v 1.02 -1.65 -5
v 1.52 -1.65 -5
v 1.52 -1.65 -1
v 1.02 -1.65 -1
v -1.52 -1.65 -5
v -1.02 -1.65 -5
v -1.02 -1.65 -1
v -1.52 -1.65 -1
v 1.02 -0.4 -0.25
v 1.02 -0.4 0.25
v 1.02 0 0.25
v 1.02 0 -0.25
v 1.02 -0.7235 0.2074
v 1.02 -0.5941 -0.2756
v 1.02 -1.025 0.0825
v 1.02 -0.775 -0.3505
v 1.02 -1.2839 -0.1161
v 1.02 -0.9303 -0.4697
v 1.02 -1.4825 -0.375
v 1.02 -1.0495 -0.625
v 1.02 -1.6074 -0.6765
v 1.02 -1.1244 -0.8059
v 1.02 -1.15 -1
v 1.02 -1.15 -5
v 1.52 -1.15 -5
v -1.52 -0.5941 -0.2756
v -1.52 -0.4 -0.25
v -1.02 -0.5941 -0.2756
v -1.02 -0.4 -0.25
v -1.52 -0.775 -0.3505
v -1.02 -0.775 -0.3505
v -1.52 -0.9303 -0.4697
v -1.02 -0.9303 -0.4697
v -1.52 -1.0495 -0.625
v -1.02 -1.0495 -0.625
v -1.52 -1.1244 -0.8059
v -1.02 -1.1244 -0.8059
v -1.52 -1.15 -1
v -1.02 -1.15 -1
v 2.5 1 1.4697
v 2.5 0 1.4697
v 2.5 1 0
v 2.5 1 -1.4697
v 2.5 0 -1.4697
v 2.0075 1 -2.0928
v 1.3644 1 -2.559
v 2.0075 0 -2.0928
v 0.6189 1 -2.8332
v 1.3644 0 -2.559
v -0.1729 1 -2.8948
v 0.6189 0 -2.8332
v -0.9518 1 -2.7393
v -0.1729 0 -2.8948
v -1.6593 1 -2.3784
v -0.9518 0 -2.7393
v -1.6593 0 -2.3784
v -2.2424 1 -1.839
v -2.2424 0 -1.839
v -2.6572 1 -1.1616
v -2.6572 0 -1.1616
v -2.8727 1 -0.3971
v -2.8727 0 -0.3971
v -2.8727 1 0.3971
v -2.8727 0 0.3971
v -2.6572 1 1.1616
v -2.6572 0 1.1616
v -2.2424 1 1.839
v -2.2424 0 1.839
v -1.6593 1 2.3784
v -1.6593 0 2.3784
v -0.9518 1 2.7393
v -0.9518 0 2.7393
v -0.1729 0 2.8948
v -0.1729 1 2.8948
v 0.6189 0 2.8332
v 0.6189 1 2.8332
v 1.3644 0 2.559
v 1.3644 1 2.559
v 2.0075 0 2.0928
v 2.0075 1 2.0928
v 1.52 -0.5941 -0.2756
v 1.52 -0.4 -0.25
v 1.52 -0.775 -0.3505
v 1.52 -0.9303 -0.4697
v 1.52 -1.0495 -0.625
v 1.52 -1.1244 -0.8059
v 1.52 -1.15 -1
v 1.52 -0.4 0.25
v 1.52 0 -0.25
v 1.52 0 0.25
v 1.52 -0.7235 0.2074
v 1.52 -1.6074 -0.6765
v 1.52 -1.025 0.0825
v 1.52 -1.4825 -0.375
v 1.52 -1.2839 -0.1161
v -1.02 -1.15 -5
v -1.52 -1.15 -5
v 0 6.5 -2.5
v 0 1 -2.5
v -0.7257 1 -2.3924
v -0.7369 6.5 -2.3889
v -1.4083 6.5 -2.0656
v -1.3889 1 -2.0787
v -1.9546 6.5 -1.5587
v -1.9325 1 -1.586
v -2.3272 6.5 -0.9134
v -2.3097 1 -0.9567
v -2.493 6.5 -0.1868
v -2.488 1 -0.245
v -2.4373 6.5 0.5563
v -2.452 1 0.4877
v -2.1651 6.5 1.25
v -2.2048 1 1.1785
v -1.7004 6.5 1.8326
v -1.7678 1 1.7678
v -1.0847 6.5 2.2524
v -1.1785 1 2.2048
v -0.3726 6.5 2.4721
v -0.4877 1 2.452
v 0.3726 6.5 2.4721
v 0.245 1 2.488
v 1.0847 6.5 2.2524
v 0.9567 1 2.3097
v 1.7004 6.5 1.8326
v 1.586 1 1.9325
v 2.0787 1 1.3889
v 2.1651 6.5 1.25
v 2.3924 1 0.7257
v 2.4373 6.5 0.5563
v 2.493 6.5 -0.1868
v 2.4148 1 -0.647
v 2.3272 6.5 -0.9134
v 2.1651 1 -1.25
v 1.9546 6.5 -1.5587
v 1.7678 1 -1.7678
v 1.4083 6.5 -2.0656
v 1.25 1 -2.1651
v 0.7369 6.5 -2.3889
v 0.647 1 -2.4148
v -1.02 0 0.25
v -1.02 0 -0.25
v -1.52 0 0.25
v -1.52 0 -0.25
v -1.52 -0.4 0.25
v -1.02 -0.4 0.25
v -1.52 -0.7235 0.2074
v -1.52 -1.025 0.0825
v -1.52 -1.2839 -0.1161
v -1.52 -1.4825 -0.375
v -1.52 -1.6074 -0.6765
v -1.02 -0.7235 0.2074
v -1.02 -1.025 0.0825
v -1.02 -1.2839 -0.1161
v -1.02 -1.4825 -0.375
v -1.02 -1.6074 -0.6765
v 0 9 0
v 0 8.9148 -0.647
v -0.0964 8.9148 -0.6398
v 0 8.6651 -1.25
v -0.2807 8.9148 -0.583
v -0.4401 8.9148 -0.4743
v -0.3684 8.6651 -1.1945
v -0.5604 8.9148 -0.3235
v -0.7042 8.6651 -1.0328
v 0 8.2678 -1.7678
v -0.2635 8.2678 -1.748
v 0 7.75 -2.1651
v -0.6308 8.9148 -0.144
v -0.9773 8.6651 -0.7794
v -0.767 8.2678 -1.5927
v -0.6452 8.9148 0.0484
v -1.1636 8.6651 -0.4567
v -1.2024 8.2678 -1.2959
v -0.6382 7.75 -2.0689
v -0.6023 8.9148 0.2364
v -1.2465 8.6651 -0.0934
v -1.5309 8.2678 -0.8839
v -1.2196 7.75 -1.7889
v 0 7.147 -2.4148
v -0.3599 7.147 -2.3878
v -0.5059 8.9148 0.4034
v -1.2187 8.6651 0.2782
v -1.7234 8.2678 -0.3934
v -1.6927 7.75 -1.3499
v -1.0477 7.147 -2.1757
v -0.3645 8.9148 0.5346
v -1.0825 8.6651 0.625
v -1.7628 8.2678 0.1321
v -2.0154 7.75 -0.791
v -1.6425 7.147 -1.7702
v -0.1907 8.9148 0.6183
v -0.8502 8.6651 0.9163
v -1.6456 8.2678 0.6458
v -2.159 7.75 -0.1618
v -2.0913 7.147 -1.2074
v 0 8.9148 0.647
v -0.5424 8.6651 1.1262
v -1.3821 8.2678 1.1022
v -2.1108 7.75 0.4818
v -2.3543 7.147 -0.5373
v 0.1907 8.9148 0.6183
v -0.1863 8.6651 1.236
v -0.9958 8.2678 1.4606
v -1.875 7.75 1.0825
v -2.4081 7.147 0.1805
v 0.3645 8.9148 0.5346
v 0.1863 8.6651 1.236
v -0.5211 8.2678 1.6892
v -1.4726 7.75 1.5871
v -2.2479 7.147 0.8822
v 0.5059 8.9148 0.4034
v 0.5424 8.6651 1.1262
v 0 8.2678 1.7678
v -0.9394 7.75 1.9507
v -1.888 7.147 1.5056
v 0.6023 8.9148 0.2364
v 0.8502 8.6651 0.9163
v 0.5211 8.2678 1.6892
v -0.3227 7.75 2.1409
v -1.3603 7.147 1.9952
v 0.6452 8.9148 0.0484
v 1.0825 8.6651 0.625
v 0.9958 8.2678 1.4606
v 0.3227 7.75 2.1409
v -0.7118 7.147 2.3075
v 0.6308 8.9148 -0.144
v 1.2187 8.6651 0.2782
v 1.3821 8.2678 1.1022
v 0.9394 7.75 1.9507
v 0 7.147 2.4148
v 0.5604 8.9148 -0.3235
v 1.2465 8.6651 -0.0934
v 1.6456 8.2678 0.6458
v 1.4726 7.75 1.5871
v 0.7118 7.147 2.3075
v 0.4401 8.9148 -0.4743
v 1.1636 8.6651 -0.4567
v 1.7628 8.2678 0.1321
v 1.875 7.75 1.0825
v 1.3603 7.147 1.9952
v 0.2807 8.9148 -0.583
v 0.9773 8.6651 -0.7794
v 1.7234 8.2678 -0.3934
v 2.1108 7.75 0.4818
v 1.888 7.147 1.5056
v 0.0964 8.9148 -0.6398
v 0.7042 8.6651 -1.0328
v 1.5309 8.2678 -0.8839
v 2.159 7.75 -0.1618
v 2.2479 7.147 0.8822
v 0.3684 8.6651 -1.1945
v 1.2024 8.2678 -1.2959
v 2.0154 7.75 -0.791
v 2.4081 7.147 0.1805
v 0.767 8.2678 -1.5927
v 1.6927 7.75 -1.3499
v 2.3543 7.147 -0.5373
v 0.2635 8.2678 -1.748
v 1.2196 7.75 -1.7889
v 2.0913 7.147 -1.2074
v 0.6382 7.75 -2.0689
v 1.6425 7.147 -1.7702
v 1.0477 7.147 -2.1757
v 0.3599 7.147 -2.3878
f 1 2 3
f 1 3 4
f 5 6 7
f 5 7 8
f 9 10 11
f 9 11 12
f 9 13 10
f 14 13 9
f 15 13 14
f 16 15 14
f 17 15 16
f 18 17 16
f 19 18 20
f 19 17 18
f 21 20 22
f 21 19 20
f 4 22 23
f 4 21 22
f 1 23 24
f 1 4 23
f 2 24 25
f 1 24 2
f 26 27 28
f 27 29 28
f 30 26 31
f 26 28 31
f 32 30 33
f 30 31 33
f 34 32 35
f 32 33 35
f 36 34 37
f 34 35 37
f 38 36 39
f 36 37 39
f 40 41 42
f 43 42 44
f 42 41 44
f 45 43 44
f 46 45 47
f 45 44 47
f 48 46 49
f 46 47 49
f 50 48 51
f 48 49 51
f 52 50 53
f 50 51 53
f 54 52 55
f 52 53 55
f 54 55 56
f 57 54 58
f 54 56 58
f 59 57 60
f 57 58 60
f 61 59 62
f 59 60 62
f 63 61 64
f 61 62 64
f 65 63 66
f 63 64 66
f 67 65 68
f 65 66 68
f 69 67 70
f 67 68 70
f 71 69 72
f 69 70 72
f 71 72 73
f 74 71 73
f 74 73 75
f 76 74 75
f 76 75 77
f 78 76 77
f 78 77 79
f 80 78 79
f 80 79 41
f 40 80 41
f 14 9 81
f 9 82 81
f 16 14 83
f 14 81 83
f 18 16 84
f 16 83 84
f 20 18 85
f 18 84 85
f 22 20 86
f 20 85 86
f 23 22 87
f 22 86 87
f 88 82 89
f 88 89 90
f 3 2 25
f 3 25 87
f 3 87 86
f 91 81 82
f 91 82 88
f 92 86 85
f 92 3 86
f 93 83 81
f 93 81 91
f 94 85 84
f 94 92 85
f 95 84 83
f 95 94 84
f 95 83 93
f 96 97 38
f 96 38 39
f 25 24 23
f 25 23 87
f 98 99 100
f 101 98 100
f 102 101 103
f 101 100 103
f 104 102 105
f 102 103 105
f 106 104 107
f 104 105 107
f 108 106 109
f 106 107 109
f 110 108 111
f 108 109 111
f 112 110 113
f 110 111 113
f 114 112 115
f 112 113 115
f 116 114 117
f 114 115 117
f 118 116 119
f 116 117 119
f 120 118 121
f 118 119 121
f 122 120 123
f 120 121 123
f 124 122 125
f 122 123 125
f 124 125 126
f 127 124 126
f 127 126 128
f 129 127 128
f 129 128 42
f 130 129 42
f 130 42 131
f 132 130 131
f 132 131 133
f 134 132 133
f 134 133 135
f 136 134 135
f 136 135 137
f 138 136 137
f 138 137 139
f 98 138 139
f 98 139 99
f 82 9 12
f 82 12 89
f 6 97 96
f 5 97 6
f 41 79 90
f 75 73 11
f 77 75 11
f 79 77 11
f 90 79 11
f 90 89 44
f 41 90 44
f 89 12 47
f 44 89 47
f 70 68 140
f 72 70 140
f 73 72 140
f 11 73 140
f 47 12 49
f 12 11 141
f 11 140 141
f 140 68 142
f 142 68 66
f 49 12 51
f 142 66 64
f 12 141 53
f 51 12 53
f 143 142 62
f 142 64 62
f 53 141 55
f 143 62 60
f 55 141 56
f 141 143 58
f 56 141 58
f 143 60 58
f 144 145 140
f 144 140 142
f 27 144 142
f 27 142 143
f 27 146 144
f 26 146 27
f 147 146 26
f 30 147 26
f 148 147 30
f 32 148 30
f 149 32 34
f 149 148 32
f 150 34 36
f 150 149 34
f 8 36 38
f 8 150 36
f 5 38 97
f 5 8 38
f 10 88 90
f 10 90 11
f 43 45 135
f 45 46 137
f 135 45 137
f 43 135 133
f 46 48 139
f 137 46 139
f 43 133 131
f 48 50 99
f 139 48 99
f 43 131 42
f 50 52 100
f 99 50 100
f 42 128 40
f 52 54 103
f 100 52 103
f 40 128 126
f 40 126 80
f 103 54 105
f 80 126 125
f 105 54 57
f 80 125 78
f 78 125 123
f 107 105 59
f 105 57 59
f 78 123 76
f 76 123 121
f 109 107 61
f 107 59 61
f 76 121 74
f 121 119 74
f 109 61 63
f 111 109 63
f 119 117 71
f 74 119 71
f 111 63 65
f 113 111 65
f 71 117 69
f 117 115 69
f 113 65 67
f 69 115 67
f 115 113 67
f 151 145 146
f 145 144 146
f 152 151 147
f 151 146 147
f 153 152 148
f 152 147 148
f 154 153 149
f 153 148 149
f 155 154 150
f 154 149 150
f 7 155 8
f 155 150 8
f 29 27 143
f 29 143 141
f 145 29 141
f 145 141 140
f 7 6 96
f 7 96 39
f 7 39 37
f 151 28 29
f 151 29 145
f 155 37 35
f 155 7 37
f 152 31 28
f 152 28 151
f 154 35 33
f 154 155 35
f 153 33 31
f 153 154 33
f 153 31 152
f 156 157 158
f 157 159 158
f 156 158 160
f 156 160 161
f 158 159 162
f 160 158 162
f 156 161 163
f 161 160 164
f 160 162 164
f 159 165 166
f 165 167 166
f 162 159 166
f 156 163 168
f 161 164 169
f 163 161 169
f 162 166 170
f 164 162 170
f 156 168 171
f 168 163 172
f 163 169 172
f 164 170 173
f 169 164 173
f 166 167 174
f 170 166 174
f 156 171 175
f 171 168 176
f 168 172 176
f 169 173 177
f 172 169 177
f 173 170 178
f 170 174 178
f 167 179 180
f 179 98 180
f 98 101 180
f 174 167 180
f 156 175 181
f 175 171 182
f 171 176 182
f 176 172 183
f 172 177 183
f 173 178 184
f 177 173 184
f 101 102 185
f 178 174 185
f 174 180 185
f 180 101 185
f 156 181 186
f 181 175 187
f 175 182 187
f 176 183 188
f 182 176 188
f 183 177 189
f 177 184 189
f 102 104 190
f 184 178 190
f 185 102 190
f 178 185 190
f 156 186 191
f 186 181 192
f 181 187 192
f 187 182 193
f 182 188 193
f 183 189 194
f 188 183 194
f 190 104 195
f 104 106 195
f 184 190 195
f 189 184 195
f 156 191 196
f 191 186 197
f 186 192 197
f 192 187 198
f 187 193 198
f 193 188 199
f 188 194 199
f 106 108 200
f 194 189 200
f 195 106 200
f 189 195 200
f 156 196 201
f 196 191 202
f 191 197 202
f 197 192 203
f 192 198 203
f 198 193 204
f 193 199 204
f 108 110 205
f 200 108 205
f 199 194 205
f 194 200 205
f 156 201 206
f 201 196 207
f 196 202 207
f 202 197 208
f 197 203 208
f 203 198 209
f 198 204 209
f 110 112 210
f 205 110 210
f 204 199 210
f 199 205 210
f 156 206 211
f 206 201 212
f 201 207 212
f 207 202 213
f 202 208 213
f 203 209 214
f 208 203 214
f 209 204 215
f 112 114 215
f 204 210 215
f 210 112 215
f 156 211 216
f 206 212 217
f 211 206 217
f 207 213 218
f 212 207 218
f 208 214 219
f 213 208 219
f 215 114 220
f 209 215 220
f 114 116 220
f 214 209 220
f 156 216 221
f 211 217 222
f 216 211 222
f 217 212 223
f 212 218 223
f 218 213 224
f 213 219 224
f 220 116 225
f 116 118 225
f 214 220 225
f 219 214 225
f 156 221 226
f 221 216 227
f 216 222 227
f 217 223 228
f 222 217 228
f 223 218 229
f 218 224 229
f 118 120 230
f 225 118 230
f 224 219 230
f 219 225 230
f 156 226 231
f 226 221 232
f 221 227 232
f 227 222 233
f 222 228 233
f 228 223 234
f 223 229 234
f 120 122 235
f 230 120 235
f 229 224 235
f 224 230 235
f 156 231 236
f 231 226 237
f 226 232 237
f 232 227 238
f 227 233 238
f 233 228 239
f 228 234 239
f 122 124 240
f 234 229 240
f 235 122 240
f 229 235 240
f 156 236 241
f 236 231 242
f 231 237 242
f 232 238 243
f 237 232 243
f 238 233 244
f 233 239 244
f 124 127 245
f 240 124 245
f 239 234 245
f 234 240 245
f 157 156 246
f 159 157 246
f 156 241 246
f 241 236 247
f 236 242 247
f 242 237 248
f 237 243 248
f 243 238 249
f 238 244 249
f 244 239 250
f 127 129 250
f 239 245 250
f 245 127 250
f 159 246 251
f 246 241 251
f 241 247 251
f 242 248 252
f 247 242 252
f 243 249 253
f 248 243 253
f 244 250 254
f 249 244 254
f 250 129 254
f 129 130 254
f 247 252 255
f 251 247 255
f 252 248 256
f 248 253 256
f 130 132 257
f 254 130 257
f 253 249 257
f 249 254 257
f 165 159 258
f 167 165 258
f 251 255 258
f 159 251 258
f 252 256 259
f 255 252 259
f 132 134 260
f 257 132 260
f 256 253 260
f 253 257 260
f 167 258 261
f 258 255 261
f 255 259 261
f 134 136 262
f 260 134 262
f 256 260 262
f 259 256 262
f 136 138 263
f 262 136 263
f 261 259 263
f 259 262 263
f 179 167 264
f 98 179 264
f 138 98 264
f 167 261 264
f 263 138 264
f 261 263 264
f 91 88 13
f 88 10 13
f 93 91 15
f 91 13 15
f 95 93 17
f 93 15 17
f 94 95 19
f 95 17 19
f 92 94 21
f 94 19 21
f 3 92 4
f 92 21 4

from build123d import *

# Parameters (mm, degrees)
SKETCH2_W          = 0.4
SKETCH2_H          = 2.939387692
CUT_EXTRUDE1_DEPTH = 10.890399385
SKETCH3_W          = 0.5
SKETCH3_H          = 0.5


with BuildPart() as part:
    # Sketch1 → Revolve1 (revolve)
    with BuildSketch(Plane(origin=(0, 0, 0), x_dir=(1, 0, 0), z_dir=(0, 0, -1)), mode=Mode.PRIVATE) as revolve1_sk:
        with BuildLine():
            Line((0, 0), (0, -9))
            ThreePointArc((0, -9), (1.767766953, -8.267766953), (2.5, -6.5))
            Line((2.5, -6.5), (2.5, -1))
            Line((2.5, -1), (2.9, -1))
            Line((2.9, -1), (2.9, 0))
            Line((2.9, 0), (0, 0))
        make_face()
    revolve(revolve1_sk.sketch.rotate(Axis((0, 0, 0), (0, 1, 0)), 90), axis=Axis((0, 0, 0), (0, 1, 0)))

    # Sketch2 → Cut-Extrude1 (cut, through all)
    with BuildSketch(Plane(origin=(0, 0, 0), x_dir=(-1, 0, 0), z_dir=(0, -1, 0))):
        with Locations((-2.7, 0)):
            Rectangle(SKETCH2_W, SKETCH2_H)
    extrude(amount=-CUT_EXTRUDE1_DEPTH, mode=Mode.SUBTRACT)

    # Sweep1: sweep along a path in Sketch4
    with BuildLine(Plane(origin=(-1.27, 0, 0), x_dir=(0, 0, -1), z_dir=(1, 0, 0))) as sweep1_path:
        Line((0, 0), (0, -0.4))
        ThreePointArc((0, -0.4), (0.292893219, -1.107106781), (1, -1.4))
        Line((1, -1.4), (5, -1.4))
    # Sketch3 → Sweep1 (sweep)
    with BuildSketch(Plane(origin=(0, 0, 0), x_dir=(-1, 0, 0), z_dir=(0, -1, 0))):
        with Locations((-1.27, 0)):
            Rectangle(SKETCH3_W, SKETCH3_H)
        with Locations((1.27, 0)):
            Rectangle(SKETCH3_W, SKETCH3_H)
    sweep(path=sweep1_path.line)


solid = part.part
